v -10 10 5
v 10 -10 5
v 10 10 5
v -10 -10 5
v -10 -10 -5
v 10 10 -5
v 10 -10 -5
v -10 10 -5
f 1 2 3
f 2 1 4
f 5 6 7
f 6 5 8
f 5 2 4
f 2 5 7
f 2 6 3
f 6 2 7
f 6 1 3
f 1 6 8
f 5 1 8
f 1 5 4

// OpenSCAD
module heat_block()
{
    cube([20,20,10],center=true);    
}

heat_block();
